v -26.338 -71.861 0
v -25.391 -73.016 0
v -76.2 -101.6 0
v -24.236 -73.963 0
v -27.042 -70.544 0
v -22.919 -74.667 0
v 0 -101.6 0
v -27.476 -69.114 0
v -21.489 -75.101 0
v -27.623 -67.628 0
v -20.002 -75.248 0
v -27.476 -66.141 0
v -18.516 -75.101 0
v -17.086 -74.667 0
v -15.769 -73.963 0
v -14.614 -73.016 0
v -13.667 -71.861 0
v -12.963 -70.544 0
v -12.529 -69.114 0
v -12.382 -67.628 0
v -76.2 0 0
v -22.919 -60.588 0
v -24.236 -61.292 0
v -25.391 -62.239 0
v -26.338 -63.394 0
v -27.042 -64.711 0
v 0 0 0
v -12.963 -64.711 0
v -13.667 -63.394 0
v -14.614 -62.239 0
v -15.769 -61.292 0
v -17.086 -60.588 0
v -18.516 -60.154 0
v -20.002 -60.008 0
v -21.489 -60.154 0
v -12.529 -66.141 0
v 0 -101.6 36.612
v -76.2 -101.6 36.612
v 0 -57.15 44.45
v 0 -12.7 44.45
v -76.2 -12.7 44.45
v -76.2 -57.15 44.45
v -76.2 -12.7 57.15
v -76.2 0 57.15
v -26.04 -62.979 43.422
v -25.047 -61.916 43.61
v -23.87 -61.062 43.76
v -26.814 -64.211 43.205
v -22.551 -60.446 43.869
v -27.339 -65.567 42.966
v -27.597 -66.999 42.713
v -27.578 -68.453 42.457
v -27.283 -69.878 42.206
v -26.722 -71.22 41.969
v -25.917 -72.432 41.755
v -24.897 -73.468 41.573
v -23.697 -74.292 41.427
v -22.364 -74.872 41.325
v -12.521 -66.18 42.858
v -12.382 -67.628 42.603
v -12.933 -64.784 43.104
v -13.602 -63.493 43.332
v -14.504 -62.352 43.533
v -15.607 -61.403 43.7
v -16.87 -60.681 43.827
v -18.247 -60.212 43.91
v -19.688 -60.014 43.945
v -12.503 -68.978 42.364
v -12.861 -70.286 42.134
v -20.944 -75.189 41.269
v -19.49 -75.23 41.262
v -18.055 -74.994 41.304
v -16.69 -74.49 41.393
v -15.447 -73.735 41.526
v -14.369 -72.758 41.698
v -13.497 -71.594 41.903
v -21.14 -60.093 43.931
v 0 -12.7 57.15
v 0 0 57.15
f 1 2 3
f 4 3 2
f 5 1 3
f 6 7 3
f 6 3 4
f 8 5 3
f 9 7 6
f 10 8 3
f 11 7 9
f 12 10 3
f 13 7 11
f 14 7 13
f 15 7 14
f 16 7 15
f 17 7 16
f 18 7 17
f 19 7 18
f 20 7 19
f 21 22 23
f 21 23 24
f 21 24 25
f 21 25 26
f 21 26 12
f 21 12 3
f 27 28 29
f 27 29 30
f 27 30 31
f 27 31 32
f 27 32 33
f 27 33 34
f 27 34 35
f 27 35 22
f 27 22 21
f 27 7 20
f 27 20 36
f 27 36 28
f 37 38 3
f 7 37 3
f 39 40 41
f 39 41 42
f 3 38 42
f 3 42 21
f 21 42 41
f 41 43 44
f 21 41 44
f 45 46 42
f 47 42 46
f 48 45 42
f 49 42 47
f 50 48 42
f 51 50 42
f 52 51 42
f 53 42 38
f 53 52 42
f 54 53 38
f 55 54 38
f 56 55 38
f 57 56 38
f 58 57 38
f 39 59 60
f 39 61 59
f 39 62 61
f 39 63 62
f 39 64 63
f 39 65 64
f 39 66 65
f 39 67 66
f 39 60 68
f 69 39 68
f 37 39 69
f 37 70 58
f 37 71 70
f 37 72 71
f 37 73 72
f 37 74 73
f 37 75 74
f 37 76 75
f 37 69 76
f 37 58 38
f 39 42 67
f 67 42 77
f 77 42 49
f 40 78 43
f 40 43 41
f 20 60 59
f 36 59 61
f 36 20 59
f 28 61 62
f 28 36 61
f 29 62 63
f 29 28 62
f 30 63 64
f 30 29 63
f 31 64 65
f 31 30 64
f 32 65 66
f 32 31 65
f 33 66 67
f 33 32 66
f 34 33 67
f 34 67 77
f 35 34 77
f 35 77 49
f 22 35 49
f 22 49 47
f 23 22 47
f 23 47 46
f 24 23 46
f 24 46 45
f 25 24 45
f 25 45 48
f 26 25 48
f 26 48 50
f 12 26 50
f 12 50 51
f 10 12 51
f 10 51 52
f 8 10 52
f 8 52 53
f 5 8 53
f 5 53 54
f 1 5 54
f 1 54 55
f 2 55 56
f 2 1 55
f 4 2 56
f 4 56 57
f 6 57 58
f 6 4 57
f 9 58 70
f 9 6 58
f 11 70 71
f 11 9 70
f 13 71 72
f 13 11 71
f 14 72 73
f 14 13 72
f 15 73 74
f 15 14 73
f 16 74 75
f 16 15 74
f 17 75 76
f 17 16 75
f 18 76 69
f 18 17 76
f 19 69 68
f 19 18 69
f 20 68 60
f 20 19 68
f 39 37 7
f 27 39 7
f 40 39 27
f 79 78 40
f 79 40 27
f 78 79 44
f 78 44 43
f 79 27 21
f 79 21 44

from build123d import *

# Parameters (mm, degrees)
F1_DEPTH = 76.2
F2_R     = 7.62
F3_DEPTH = 50.8


with BuildPart() as f1:
    # F0 (on Right) → F1 (new body)
    with BuildSketch(Plane.YZ):
        Polygon((-101.6, 0), (0, 0), (0, 57.15), (-12.7, 57.15), (-12.7, 44.481661), (-12.7, 44.45), (-57.15, 44.45), (-101.6, 36.612266), align=None)
    extrude(amount=-F1_DEPTH)

    # F2 (on Top) → F3 (cut)
    with BuildSketch(Plane.XY):
        with Locations((-20.0025, -67.6275)):
            Circle(F2_R)
    extrude(amount=F3_DEPTH, mode=Mode.SUBTRACT)


solid = f1.part
